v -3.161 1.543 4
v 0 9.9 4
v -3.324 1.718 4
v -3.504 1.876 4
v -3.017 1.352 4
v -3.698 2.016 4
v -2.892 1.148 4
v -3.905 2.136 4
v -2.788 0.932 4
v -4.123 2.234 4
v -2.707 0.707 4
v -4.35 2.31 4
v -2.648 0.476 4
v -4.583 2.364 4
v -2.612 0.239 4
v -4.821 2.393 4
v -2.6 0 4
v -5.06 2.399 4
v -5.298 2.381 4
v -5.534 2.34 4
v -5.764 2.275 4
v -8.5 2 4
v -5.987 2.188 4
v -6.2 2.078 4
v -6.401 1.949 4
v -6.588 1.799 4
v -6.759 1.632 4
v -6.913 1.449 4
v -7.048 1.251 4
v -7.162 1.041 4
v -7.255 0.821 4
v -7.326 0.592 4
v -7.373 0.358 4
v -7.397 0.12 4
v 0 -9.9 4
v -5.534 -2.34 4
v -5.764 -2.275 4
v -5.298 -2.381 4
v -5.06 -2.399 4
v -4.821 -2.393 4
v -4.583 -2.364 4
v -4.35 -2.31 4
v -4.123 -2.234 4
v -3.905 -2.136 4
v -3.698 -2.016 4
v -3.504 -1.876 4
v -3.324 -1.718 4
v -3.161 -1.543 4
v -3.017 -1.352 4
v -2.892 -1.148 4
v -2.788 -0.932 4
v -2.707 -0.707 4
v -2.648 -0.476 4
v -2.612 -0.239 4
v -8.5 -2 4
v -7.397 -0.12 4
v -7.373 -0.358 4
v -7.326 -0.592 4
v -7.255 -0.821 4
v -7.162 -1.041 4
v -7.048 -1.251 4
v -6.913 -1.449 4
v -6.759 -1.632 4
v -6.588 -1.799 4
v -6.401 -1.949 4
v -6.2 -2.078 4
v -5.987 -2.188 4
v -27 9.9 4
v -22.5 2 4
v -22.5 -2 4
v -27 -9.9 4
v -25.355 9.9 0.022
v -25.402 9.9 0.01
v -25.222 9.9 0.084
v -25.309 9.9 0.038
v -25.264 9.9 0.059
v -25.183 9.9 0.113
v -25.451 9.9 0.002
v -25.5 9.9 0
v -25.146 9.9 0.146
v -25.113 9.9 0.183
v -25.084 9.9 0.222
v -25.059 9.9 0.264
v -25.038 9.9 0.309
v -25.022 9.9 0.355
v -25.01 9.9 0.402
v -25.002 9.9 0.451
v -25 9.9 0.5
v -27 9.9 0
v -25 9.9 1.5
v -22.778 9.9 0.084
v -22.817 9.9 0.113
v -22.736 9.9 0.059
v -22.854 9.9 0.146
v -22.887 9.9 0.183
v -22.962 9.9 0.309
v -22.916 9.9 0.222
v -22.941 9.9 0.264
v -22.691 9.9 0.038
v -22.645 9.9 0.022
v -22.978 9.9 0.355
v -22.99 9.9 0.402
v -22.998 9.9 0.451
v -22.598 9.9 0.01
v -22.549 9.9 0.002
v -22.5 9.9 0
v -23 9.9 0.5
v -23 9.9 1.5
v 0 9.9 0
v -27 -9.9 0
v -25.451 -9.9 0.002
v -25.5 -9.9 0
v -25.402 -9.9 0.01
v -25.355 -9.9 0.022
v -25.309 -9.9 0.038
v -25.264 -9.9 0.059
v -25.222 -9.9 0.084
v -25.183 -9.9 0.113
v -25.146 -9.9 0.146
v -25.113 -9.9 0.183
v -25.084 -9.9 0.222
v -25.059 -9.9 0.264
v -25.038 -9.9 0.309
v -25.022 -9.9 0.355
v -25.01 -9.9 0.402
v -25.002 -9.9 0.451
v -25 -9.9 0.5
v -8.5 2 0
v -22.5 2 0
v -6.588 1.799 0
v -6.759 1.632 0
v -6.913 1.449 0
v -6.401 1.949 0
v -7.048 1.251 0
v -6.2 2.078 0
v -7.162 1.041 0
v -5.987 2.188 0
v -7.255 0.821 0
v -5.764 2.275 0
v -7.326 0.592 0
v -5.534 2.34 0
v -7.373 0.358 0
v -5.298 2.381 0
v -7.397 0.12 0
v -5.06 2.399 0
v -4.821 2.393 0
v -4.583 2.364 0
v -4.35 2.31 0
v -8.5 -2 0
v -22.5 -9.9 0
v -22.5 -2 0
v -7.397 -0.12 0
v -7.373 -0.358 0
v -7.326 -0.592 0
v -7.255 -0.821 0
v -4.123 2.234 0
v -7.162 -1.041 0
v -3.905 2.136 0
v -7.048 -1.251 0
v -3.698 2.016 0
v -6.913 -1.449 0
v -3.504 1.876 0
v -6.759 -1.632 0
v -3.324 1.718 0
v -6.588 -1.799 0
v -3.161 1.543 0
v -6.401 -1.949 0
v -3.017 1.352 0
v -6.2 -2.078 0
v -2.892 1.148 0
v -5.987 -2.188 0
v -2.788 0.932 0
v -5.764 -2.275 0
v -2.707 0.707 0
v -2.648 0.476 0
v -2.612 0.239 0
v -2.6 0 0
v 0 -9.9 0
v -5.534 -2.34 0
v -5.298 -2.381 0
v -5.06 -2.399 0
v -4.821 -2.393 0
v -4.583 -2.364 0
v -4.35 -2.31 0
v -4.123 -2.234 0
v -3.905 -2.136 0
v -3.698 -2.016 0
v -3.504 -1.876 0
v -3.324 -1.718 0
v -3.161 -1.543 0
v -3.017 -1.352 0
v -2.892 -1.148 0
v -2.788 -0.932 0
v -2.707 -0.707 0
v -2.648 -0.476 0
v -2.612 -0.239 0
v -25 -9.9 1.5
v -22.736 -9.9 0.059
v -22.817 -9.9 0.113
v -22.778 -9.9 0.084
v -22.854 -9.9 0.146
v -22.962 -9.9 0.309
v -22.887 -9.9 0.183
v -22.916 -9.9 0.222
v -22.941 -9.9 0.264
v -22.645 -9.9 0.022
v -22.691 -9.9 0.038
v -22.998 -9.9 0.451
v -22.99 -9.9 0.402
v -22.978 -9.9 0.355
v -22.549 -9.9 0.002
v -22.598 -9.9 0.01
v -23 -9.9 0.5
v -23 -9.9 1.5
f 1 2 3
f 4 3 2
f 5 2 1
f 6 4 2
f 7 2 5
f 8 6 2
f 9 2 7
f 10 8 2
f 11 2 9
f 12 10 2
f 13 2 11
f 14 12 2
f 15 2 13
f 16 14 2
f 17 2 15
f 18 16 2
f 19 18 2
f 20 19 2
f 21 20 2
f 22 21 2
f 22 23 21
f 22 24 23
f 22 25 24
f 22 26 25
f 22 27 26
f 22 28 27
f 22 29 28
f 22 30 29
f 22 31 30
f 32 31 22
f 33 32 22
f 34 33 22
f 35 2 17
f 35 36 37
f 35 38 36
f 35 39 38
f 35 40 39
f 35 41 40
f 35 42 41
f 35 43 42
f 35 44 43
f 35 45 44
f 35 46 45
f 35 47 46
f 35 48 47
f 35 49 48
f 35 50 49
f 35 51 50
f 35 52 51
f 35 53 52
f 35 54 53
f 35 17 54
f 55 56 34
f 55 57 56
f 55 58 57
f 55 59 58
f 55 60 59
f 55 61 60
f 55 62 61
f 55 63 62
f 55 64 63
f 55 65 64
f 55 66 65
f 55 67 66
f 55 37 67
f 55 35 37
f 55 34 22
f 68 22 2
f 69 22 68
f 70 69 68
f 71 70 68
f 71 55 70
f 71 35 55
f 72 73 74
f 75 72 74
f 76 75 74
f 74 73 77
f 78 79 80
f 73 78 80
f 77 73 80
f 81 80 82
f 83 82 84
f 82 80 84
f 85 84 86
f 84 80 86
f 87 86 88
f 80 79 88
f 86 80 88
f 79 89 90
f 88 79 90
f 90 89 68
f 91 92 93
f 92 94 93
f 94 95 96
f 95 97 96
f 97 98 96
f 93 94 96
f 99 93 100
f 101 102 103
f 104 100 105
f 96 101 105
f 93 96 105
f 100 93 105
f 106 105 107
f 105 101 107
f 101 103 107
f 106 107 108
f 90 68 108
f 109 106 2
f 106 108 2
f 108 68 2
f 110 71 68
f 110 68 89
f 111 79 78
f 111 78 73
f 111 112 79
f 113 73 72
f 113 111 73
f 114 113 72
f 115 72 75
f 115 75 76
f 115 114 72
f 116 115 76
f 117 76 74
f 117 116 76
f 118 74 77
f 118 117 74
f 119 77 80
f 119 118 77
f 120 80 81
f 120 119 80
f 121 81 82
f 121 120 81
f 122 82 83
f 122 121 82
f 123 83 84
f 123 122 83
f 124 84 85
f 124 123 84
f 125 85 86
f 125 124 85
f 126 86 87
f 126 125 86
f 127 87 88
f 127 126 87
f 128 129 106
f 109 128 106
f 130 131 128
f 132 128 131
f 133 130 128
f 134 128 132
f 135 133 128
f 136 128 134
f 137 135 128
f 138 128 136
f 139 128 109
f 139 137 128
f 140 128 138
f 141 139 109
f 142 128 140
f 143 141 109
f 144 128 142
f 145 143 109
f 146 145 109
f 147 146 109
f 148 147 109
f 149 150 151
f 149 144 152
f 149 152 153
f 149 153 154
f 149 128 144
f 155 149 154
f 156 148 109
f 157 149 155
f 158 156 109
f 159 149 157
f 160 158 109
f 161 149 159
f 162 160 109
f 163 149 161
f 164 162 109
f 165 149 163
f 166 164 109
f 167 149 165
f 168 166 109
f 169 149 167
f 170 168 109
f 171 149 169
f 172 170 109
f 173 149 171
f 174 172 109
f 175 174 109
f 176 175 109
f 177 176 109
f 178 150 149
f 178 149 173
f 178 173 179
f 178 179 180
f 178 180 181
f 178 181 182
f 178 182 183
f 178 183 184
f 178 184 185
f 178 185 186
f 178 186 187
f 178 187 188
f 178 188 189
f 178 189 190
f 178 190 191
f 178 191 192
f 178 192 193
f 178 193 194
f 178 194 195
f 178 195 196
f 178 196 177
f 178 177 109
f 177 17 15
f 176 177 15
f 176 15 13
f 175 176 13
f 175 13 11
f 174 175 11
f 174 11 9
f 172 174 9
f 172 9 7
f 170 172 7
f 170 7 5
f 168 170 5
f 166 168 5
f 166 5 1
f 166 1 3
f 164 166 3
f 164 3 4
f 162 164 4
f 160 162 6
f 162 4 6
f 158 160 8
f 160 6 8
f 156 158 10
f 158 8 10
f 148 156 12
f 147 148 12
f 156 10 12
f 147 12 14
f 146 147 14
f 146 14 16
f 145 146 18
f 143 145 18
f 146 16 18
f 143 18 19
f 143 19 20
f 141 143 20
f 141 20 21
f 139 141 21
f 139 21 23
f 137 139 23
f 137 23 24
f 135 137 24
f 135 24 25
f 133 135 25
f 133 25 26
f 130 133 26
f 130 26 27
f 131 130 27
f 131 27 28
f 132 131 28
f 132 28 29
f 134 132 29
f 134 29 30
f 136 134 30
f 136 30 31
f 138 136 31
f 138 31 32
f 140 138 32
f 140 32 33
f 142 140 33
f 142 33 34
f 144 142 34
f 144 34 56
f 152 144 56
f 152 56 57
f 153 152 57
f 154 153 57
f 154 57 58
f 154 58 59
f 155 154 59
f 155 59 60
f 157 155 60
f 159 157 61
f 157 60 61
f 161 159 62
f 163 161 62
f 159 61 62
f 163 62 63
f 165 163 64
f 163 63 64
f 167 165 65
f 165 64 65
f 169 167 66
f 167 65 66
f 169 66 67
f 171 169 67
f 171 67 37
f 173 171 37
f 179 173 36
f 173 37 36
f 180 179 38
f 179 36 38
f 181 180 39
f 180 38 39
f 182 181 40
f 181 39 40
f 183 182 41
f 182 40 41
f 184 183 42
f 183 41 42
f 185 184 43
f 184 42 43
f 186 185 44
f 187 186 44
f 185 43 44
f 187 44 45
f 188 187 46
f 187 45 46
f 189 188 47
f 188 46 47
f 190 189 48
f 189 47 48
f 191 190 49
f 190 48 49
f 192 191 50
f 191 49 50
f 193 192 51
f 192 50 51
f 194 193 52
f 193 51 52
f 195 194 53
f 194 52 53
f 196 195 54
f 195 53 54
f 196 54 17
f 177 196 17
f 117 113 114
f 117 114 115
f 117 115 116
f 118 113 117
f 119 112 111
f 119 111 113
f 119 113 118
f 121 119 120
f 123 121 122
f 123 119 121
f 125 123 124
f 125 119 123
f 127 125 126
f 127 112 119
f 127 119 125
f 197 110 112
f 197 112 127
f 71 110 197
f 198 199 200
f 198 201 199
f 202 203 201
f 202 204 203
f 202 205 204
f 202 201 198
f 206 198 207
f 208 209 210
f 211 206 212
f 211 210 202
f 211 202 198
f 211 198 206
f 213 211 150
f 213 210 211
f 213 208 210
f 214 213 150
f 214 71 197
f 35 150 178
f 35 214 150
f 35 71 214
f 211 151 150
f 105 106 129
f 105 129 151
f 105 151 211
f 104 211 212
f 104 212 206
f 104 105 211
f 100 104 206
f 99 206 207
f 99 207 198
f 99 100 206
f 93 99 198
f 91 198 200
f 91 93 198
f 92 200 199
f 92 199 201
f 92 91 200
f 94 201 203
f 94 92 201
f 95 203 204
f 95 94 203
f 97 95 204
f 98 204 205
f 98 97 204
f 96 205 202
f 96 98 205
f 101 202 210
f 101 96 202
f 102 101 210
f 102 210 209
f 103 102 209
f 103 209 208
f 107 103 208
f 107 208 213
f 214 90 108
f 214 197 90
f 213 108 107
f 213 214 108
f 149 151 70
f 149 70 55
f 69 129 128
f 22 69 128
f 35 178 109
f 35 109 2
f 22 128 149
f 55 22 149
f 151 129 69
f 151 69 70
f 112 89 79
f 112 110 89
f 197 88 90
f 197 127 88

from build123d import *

# Parameters (mm, degrees)
F1_DEPTH      = 9.9
F1_DEPTH_BACK = 9.9
F2_R          = 2.4
F3_DEPTH      = 4.001
F4_R          = 0.5
F5_W          = 14
F5_H          = 4
F6_DEPTH      = 4.001


with BuildPart() as f1:
    # F0 (on Front) → F1 (new body, two sides)
    with BuildSketch(Plane.XZ) as f1_sk:
        Polygon((-23, 0), (0, 0), (0, 4), (-27, 4), (-27, 0), (-25, 0), (-25, 1.5), (-23, 1.5), align=None)
    extrude(amount=F1_DEPTH)
    extrude(f1_sk.sketch, amount=-F1_DEPTH_BACK)

    # F2 (on face) → F3 (cut, through all)
    with BuildSketch(Plane.XY.offset(4)):
        with Locations((-5, 0)):
            Circle(F2_R)
    extrude(amount=-F3_DEPTH, mode=Mode.SUBTRACT)

    # F4
    f4_edges = [f1.edges().sort_by_distance(p)[0] for p in [
        (-25, 0, 0),
        (-23, 0, 0),
    ]]
    fillet(f4_edges, radius=F4_R)

    # F5 (on face) → F6 (cut, through all)
    with BuildSketch(Plane(origin=(0, 0, 0), x_dir=(1, 0, 0), z_dir=(0, 0, -1))):
        with Locations((-15.5, 0)):
            Rectangle(F5_W, F5_H)
    extrude(amount=-F6_DEPTH, mode=Mode.SUBTRACT)


solid = f1.part
